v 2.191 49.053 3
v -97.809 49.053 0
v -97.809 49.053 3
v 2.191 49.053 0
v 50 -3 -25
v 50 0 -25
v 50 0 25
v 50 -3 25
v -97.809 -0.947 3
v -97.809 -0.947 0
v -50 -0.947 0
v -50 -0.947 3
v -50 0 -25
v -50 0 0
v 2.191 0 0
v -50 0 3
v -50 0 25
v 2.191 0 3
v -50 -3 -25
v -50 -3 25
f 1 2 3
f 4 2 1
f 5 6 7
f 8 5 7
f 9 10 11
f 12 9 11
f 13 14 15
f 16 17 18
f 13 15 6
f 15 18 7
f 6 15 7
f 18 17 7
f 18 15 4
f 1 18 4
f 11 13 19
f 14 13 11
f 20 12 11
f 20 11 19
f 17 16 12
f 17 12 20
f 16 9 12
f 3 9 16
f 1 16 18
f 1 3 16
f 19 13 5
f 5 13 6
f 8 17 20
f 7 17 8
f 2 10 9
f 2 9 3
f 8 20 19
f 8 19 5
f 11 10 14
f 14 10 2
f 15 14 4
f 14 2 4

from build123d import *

# Parameters (mm, degrees)
F0_W     = 100
F0_H     = 50
F1_DEPTH = 3
F2_W     = 100
F2_H     = 50
F3_DEPTH = 3


with BuildPart() as f1:
    # F0 (on Front) → F1 (new body)
    with BuildSketch(Plane.XZ):
        Rectangle(F0_W, F0_H)
    extrude(amount=F1_DEPTH)

    # F2 (on Top) → F3 (join)
    with BuildSketch(Plane.XY):
        with Locations((-47.80928, 24.052748)):
            Rectangle(F2_W, F2_H)
    extrude(amount=F3_DEPTH)


solid = f1.part
